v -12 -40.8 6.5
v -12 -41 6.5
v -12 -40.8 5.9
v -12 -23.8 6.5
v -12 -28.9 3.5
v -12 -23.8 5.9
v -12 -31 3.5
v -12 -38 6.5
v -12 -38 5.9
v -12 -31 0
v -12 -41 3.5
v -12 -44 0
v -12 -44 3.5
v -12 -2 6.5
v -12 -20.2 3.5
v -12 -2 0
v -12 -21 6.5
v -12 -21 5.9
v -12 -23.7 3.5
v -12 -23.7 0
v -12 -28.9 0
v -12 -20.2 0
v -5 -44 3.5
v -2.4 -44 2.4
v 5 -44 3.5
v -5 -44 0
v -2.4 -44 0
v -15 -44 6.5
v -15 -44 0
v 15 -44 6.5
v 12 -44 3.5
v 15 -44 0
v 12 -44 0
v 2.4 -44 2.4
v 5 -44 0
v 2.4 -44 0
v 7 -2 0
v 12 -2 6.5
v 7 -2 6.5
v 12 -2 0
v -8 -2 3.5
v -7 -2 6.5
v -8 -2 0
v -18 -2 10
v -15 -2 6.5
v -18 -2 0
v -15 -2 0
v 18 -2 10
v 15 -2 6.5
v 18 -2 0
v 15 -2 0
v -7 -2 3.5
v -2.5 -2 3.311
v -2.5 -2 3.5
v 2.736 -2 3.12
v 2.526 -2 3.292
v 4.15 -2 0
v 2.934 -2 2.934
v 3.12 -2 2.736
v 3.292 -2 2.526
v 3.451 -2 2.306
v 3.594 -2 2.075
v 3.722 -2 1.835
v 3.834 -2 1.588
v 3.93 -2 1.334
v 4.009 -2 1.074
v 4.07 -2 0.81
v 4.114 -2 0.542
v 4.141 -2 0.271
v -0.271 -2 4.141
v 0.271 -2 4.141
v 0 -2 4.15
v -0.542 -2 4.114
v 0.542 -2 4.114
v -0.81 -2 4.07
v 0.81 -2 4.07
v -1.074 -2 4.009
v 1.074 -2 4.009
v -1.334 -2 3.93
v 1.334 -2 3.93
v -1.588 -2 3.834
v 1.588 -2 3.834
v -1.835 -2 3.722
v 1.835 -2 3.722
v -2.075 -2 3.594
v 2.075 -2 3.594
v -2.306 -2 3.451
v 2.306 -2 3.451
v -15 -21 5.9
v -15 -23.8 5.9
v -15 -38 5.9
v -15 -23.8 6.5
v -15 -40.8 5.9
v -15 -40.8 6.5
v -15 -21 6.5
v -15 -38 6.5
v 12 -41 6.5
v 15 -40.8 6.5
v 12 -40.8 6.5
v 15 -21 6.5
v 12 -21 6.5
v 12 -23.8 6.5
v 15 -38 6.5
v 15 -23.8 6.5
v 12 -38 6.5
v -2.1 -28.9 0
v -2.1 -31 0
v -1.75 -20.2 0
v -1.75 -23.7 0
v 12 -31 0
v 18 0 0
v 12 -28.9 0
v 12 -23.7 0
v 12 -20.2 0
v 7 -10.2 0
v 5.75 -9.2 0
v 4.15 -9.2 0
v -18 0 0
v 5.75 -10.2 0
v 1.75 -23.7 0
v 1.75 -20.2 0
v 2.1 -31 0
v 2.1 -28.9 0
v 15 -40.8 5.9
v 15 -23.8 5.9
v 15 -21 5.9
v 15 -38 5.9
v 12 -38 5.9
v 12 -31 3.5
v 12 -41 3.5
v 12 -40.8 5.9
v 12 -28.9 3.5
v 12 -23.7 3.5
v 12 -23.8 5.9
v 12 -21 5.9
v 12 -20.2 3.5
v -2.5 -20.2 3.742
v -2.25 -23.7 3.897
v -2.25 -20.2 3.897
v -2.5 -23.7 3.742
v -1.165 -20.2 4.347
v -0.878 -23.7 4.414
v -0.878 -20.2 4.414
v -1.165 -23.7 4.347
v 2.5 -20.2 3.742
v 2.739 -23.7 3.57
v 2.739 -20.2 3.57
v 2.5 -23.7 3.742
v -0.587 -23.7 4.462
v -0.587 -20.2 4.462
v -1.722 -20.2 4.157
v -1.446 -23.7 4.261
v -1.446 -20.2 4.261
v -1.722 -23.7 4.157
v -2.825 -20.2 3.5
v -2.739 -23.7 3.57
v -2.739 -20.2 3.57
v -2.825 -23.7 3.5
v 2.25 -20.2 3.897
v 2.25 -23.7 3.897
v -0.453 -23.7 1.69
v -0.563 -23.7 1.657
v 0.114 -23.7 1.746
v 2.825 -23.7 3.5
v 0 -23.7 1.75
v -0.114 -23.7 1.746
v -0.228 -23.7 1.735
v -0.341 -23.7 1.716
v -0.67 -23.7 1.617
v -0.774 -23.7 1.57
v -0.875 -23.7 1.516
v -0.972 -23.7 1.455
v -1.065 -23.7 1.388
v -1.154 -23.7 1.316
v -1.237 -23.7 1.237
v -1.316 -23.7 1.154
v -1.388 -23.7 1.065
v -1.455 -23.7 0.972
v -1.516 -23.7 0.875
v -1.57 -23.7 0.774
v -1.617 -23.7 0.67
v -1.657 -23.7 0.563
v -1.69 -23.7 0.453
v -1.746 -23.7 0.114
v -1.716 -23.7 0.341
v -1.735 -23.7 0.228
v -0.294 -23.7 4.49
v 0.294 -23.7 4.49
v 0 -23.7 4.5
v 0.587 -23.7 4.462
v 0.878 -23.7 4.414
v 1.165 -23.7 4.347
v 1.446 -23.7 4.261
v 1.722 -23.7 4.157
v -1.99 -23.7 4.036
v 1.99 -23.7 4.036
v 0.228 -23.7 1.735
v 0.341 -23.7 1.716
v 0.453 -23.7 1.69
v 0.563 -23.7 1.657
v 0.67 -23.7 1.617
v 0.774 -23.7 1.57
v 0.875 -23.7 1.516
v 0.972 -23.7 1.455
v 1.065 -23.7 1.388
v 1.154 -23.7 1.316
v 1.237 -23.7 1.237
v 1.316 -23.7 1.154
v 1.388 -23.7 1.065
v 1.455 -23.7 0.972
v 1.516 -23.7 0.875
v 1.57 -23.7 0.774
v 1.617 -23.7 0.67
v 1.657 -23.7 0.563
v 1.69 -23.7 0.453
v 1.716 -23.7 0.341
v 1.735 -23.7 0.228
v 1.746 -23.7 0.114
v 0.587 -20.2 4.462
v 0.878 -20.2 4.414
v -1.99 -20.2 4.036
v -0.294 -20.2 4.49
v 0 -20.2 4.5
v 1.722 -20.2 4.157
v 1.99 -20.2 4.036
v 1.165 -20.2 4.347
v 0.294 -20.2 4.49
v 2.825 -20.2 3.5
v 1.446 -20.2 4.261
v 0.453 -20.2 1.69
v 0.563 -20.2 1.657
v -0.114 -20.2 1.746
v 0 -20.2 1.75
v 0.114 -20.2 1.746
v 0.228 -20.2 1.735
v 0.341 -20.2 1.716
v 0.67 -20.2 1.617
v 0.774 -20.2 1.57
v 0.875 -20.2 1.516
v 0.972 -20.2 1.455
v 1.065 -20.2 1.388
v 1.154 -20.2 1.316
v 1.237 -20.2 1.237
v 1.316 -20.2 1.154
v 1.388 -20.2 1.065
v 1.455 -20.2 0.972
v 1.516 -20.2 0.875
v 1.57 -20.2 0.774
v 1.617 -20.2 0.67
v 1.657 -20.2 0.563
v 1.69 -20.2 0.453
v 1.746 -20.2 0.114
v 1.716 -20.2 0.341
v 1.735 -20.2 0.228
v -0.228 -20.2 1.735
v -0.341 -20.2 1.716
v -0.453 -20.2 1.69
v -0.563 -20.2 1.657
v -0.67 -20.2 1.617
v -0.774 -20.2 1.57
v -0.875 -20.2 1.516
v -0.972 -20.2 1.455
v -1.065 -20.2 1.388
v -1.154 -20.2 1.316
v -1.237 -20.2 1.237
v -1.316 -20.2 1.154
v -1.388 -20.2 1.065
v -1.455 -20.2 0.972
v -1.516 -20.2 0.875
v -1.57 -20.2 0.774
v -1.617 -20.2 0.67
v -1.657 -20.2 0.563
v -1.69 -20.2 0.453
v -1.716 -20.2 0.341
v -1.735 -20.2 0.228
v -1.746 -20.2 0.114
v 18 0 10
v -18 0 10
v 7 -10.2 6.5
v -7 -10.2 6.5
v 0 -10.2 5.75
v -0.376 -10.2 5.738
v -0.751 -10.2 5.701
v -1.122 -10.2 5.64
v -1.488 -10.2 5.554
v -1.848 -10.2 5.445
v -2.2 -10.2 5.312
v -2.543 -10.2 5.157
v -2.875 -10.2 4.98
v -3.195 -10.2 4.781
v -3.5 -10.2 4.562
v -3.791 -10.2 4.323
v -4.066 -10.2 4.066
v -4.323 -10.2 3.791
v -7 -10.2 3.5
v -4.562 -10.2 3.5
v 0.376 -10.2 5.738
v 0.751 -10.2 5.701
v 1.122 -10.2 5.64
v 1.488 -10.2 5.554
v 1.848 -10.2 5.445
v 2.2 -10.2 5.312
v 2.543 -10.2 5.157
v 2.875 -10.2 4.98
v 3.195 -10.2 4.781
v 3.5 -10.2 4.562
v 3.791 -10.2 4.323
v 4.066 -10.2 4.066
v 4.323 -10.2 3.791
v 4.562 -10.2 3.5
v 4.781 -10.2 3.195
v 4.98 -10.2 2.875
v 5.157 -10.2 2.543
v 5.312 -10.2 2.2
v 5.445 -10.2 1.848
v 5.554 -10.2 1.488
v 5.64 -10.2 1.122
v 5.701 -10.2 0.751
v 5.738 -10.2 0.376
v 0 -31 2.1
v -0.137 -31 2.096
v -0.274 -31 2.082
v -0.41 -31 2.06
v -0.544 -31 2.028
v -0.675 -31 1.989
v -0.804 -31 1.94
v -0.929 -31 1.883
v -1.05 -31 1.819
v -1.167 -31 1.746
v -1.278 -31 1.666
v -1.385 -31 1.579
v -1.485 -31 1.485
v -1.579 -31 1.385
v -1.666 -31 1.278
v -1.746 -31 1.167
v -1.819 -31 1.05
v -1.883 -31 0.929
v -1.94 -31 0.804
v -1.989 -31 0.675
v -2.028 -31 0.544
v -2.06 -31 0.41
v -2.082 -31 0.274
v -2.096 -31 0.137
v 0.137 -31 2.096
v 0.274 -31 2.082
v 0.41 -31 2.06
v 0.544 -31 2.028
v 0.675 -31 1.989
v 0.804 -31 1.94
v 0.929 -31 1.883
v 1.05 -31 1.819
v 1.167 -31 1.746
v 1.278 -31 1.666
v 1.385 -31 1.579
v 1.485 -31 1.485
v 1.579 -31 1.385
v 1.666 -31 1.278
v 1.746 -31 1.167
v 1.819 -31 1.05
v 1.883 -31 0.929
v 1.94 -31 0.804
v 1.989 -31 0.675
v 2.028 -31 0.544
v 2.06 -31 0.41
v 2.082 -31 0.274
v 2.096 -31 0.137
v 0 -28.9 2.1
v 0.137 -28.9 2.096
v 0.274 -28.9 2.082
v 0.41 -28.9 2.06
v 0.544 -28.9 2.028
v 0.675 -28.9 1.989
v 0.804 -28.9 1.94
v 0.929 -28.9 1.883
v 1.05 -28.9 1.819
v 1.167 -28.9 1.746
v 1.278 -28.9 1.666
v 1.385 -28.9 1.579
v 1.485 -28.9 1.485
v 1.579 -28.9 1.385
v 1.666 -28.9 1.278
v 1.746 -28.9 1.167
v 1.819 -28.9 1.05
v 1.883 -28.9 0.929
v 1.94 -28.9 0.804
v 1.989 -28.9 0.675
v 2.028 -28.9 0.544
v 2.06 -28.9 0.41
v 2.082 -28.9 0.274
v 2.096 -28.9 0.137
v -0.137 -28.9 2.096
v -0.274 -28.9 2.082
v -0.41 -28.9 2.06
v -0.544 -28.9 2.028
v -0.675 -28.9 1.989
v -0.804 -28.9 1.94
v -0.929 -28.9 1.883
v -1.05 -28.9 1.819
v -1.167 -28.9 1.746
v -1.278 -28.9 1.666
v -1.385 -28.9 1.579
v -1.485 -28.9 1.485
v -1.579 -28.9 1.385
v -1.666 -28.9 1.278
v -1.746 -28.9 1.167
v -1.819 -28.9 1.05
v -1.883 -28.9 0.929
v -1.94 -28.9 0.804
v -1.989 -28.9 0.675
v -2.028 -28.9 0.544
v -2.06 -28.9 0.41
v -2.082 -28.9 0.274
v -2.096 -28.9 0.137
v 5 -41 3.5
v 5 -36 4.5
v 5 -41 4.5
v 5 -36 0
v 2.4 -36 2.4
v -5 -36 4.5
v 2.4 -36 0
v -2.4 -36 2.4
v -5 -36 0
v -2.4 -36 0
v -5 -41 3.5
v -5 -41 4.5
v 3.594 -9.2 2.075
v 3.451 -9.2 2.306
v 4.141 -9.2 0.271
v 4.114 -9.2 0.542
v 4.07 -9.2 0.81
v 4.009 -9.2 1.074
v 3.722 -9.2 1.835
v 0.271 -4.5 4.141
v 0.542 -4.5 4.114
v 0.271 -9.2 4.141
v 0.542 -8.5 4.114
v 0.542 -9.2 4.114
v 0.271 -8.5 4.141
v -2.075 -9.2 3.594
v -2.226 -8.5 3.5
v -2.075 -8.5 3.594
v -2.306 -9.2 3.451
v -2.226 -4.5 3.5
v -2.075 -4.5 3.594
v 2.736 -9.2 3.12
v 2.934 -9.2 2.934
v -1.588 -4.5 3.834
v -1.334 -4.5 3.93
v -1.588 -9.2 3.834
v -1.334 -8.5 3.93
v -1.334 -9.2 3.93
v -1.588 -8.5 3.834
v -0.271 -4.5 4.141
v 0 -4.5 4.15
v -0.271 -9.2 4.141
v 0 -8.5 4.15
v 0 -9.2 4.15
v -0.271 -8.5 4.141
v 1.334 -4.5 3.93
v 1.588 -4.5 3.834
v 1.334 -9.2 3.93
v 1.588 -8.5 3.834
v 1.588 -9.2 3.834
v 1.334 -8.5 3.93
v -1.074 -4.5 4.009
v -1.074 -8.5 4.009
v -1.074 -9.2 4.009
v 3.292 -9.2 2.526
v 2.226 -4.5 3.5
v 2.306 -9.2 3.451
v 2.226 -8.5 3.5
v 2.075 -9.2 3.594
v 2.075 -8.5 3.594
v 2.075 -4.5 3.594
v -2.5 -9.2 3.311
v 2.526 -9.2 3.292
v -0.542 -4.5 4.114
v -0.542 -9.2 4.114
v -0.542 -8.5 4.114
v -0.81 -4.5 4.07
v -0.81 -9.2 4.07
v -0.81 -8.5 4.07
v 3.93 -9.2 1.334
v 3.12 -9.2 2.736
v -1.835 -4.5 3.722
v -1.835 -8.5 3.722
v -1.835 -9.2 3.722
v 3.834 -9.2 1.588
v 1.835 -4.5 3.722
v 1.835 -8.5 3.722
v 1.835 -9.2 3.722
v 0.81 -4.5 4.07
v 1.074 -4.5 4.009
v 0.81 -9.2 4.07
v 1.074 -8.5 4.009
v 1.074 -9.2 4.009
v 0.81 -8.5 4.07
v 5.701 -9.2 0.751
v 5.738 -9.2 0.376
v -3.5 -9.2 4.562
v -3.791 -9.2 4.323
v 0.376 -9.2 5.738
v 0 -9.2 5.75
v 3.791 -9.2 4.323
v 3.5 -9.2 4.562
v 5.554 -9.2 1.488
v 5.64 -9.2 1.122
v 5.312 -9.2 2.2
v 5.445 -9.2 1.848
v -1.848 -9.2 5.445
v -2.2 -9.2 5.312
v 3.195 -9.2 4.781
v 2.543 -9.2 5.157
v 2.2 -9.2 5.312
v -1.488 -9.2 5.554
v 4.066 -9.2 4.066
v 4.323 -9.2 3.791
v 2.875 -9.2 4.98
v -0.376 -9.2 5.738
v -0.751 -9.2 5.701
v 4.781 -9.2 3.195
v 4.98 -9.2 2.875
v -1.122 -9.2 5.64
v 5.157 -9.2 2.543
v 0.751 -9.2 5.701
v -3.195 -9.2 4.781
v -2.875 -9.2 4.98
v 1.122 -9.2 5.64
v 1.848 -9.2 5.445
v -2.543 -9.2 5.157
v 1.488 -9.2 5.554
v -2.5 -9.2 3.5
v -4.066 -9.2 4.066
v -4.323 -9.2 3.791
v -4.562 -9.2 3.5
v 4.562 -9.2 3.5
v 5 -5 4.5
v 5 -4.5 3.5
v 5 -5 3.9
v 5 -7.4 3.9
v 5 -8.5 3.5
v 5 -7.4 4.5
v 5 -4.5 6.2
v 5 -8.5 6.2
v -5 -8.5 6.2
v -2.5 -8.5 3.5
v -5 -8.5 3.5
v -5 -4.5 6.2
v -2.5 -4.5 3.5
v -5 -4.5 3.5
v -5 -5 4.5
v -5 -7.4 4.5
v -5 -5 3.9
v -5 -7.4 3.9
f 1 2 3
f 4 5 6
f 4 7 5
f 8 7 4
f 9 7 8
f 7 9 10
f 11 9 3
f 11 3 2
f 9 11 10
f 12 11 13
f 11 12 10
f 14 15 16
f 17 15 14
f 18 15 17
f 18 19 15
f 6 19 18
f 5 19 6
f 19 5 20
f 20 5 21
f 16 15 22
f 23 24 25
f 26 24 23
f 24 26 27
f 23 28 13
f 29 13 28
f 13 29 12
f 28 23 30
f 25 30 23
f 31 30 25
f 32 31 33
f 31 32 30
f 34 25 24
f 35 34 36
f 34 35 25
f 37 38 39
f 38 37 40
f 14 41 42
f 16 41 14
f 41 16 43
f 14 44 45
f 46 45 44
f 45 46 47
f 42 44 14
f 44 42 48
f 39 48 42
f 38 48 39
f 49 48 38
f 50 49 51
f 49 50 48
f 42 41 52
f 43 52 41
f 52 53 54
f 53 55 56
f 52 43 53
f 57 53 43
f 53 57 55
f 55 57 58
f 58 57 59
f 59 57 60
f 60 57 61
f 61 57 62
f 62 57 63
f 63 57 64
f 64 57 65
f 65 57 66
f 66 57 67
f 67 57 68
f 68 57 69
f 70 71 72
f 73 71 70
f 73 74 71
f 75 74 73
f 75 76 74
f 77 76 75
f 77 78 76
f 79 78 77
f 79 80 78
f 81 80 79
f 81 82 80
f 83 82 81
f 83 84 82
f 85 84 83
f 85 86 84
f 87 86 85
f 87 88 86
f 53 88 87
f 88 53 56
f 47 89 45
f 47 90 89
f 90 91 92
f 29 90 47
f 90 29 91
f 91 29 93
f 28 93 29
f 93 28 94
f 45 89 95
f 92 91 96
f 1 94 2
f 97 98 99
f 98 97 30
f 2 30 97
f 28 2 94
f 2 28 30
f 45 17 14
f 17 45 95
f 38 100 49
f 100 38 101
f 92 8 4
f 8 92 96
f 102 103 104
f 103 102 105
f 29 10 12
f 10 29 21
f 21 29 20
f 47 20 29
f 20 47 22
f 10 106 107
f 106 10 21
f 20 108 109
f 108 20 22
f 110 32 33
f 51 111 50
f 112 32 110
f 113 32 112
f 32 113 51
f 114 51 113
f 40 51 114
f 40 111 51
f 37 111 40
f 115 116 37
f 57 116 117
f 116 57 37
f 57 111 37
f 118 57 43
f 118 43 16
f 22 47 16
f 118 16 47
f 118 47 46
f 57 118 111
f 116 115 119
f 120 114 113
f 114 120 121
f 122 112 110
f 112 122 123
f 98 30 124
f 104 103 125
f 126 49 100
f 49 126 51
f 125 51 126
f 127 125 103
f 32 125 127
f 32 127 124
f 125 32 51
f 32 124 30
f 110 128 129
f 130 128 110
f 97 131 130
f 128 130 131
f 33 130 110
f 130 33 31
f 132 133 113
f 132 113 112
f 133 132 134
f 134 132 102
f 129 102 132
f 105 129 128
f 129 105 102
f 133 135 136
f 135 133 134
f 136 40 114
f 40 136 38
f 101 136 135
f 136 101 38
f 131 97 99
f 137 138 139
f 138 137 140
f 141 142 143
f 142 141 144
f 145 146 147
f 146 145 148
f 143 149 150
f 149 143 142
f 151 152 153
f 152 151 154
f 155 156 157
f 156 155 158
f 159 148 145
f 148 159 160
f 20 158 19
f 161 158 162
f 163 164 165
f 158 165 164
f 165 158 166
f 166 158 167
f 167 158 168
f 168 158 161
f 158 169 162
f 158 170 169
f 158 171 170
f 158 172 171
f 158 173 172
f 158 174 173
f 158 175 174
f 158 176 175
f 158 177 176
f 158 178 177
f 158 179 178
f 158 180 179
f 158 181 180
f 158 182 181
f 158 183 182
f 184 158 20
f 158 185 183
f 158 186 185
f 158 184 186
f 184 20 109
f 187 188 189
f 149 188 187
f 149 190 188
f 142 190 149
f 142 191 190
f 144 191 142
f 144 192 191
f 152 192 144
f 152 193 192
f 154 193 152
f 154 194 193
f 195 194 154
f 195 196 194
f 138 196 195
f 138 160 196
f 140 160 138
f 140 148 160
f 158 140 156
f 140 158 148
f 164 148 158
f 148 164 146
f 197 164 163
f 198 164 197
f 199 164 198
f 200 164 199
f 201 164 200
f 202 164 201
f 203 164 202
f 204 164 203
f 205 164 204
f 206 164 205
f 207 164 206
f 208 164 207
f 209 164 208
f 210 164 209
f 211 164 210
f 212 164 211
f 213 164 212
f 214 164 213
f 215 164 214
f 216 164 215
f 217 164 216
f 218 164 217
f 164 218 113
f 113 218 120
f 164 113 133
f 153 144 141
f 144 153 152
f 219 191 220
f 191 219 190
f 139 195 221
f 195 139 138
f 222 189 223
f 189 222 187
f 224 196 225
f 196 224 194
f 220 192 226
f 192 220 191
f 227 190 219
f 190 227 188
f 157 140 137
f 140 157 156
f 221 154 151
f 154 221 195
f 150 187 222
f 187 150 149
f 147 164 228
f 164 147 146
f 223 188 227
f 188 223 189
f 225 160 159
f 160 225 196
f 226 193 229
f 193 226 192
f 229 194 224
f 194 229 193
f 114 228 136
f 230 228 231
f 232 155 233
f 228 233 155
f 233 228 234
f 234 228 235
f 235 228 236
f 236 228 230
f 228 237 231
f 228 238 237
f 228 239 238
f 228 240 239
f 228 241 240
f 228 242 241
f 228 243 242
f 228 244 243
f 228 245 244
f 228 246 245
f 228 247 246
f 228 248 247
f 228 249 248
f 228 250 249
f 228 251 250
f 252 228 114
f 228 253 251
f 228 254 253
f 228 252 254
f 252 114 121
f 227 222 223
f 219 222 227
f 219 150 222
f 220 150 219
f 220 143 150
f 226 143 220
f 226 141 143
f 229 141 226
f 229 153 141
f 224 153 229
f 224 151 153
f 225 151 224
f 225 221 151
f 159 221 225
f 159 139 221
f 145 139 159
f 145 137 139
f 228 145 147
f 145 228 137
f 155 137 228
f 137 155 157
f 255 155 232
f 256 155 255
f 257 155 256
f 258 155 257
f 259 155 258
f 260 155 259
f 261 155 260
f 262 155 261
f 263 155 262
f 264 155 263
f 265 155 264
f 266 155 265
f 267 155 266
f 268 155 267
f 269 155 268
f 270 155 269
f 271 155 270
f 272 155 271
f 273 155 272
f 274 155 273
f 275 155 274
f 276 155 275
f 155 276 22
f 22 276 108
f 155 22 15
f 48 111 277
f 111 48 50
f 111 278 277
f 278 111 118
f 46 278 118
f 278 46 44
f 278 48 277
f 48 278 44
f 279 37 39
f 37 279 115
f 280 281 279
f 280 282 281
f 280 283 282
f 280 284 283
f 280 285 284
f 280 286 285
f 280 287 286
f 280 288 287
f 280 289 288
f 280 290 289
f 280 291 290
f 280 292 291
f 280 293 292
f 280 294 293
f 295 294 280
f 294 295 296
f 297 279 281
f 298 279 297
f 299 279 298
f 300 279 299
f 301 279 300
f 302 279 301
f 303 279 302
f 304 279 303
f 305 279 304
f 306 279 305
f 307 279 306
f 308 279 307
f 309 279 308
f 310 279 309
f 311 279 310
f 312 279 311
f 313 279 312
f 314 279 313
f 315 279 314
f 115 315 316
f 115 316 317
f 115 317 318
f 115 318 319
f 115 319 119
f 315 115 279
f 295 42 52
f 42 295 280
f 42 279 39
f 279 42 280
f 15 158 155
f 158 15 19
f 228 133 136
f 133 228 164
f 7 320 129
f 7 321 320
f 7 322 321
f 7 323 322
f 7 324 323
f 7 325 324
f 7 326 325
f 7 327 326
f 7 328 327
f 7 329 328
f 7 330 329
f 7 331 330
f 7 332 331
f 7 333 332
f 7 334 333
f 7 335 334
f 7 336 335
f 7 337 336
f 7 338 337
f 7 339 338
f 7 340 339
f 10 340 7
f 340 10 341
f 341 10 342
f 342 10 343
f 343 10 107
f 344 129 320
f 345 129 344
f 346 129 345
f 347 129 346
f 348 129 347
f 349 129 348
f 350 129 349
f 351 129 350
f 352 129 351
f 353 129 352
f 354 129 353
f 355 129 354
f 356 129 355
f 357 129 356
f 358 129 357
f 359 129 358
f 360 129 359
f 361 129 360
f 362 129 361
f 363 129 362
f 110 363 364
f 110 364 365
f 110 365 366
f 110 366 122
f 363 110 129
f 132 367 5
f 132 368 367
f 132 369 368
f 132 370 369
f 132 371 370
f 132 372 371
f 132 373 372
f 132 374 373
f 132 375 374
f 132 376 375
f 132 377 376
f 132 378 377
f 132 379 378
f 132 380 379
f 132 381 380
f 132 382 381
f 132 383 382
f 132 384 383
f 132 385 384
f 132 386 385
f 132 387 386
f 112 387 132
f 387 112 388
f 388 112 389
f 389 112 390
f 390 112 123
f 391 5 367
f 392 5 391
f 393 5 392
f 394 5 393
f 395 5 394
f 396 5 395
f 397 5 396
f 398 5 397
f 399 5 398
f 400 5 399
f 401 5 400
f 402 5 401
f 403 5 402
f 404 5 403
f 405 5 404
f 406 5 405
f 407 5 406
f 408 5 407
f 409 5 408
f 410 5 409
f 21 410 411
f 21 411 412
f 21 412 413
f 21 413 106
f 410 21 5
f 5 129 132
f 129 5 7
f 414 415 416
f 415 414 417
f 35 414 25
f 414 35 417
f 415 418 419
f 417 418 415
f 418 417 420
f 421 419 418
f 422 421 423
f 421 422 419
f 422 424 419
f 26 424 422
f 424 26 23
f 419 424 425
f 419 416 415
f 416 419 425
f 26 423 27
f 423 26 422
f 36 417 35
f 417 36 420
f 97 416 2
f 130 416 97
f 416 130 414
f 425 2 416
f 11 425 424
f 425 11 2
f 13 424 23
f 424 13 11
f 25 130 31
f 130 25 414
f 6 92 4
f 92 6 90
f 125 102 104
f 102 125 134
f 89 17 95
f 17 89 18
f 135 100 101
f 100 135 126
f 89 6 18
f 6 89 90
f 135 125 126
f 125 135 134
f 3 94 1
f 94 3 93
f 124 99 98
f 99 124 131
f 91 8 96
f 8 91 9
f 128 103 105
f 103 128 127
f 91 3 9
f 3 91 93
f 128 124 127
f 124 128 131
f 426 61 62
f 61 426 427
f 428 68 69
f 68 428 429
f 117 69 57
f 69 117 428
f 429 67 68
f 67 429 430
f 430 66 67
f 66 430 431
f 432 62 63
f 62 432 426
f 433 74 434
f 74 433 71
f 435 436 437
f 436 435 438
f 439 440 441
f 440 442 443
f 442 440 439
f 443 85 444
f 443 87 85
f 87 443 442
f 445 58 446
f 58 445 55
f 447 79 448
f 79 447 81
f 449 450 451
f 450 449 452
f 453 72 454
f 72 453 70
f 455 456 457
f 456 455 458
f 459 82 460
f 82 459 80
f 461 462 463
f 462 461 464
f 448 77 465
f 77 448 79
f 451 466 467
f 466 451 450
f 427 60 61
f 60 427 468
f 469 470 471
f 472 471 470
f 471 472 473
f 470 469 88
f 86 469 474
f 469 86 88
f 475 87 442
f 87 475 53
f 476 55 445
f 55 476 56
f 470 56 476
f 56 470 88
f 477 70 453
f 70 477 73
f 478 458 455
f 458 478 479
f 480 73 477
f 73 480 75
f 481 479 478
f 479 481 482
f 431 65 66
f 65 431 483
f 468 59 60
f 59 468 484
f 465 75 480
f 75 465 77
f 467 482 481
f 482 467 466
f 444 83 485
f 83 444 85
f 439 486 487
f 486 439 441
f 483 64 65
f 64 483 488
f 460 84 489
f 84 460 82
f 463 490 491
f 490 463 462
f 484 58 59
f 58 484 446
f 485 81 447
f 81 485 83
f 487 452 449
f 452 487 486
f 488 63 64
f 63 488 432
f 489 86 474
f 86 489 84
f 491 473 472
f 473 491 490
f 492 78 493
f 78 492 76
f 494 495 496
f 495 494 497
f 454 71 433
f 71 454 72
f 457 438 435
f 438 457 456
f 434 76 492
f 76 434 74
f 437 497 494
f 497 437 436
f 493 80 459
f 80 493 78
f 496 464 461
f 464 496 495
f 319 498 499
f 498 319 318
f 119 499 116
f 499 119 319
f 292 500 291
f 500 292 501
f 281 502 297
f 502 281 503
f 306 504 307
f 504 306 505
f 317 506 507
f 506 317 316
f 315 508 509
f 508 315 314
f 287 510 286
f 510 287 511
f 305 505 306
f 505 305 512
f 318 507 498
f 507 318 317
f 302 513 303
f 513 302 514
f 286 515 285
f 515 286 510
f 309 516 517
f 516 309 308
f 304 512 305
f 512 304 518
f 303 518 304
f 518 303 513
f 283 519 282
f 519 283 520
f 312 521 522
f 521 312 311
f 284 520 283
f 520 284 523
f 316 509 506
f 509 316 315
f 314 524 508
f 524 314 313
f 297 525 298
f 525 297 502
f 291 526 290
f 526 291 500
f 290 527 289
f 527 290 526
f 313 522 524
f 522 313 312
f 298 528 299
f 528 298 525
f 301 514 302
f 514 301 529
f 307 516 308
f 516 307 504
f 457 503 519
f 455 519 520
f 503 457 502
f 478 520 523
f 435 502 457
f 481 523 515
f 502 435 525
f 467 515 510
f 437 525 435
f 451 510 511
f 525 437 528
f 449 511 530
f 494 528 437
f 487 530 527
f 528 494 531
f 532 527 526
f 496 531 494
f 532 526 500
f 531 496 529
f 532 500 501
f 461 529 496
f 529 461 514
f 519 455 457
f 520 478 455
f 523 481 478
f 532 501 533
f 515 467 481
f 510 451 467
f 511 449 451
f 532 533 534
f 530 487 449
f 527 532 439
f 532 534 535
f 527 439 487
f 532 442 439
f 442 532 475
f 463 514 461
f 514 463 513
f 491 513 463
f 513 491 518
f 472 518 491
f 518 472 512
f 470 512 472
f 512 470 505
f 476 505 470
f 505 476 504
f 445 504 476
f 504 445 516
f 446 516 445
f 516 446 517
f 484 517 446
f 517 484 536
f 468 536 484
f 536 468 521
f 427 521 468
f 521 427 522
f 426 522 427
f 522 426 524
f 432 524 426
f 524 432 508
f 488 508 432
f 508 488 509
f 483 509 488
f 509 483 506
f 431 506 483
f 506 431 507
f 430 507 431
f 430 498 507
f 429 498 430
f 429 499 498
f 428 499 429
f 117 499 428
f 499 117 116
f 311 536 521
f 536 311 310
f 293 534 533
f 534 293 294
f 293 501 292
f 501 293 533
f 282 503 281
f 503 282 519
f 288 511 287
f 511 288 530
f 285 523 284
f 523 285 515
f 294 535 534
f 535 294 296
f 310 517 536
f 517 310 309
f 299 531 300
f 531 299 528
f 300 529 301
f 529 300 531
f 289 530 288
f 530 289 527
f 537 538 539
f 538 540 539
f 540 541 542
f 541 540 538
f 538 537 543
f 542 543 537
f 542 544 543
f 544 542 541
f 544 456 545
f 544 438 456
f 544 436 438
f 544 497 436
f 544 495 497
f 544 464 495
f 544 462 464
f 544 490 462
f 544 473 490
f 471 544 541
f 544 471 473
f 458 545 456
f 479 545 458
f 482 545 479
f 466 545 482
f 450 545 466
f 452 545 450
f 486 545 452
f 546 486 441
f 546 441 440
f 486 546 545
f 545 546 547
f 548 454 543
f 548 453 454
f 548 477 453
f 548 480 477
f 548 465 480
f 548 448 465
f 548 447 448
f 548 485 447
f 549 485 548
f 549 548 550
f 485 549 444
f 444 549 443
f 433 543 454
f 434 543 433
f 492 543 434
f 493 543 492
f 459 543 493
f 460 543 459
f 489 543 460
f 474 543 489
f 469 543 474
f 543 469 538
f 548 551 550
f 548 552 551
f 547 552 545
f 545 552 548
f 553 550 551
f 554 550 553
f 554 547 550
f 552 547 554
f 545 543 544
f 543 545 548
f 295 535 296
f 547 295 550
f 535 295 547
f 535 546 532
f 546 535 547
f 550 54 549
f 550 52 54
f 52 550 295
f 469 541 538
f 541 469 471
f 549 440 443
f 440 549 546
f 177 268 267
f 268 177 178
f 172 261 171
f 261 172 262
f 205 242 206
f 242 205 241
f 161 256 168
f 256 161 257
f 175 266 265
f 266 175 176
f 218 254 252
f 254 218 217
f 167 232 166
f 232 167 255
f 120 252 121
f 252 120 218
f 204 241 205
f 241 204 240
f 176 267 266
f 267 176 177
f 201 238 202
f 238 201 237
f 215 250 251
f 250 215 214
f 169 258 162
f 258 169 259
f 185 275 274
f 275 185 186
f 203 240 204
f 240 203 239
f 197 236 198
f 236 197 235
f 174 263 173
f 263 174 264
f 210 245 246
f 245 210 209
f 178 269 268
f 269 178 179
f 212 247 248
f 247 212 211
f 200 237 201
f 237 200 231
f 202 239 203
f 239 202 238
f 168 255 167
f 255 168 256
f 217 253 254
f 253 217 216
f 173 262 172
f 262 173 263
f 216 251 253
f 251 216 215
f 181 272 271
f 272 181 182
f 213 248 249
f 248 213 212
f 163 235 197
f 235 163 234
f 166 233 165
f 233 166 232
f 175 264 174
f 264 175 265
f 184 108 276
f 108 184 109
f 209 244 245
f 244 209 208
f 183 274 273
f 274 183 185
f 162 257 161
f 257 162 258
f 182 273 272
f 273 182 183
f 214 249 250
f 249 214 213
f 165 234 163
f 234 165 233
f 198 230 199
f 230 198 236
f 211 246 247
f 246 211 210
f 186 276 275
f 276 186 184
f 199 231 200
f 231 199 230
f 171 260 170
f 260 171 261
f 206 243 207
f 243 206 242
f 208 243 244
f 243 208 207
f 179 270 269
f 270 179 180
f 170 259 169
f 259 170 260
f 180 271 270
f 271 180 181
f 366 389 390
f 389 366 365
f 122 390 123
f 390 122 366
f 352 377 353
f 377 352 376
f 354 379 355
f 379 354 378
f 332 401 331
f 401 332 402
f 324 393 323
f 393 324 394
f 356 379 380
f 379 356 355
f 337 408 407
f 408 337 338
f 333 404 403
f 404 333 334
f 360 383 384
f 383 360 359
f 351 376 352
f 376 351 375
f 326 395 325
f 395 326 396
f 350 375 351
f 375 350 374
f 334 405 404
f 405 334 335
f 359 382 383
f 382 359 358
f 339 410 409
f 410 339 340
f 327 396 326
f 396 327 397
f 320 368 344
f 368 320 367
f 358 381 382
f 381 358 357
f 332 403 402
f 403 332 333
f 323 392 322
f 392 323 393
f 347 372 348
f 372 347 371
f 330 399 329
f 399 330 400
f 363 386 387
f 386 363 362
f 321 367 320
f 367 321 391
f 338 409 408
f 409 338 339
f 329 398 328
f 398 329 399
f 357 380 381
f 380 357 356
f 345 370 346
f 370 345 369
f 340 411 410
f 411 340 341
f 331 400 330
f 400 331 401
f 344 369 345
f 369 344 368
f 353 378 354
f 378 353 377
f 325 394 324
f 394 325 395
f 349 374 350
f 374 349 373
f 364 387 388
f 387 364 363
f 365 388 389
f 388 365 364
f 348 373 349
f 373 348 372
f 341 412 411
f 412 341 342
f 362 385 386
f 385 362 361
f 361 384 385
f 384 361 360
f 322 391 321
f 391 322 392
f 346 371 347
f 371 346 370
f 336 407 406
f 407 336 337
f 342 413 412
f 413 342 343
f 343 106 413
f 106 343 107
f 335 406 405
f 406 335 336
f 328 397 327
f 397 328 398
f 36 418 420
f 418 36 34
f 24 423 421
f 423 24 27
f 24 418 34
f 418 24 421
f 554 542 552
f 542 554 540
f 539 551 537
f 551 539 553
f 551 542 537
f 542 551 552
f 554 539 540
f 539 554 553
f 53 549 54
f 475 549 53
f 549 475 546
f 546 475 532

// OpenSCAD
// E-302 revision 4, mm. E-301 functional thread and foot retained.
// Source photo dimensions are NOT physical measurements of owner motors.
part="half-front";
pin_height=50;
tip_r=1.05; // Owner selected C (three identification notches), 2026-10-19.
$fn=96;
body_d=8.30;
pcb_half_width=3.5; // open side envelope, unmeasured PCB: check before closing
socket_bottom=13.2; // Remove 2 mm at motor end; bearing/drive seat stay fixed.
socket_top=19.5;
module cradle_half(){
 difference(){
  union(){
   translate([-18,0,0])cube([36,10,2]);
   for(x=[-15,12])translate([x,0,2])cube([3,6.5,42]);
   translate([-7,0,2])cube([14,6.5,8.2]);
   translate([-15,0,20.2])cube([30,3.5,3.5]);
   intersection(){translate([0,0,20.2])cylinder(d=9,h=3.5);translate([-5,0,20])cube([10,5,4]);}
   translate([-15,0,28.9])cube([30,3.5,2.1]);
   translate([-5,0,36])cube([10,4.5,8]);
   translate([-15,3.5,41])cube([30,3,3]);
  }
  translate([0,0,2])cylinder(d=body_d,h=10);
  translate([0,0,9.2])cylinder(d=11.5,h=1.1);
  // Clearance behind transverse flexure; rigid cradle stops frame closure.
  translate([-5,3.5,4.5])cube([10,2.7,4]);
  translate([0,0,19.9])cylinder(d=3.5,h=4.1);
  translate([0,0,28.8])cylinder(d=4.2,h=2.4);
  translate([-2.4,-2.4,35.9])cube([4.8,4.8,8.3]);
  // Keep elastic away from the motor spring and open PCB windows.
  for(z=[21,38])translate([-16,5.9,z])cube([32,2,2.8]);
 }
 // Transverse two-ended flexure: 10 mm bridge, .6 thick, 2.4 axial width.
 // Flat first bridging layer has anchors at both ends; nominal preload .10.
 translate([-5.2,3.9,5])cube([10.4,.6,2.4]);
}
// Cut AFTER adding spring: no spring or wall may cross the PCB envelope.
module frame_half(){
 difference(){
  cradle_half();
  translate([-8,-.01,2])cube([5.5,pcb_half_width+.01,8.5]);
 }
}
module bore_profile(){
 difference(){
  circle(d=2.5);
  // Rounded wall-integrated lobes, not a miniature involute gear.
  for(a=[0,120,240])rotate(a)translate([tip_r+.5,0])circle(r=.5);
 }
}
module cup(){
 difference(){
  union(){
   translate([-6.5,-6.5,24.2])cube([13,13,4.6]);
   translate([0,0,19.7])cylinder(d=3,h=4.51);
   translate([0,0,socket_bottom])cylinder(d=5,h=19.71-socket_bottom);
  }
  translate([-5.2,-5.2,26.2])cube([10.4,10.4,3]);
  translate([0,0,socket_bottom-.01])linear_extrude(socket_top-socket_bottom+.01)bore_profile();
  // Lead-in removes the first .5 mm of full-depth engagement.
  translate([0,0,socket_bottom-.01])cylinder(d1=2.9,d2=1.9,h=.51);
  // 1/2/3 external notches identify A/N/C, away from bearing and square socket.
  for(i=[0:(tip_r<.98?0:tip_r>1.02?2:1)])
   translate([-3+i*3,6.1,27])cube([1,1,2]);
 }
}
if(part=="half-front")rotate([90,0,0])frame_half();
if(part=="half-back")rotate([90,0,0])mirror([1,0,0])frame_half();
if(part=="cup")translate([0,0,28.8])rotate([180,0,0])cup();
if(part=="assembly") {frame_half();mirror([0,1,0])frame_half();cup();}

// Exact supplied E-301 meshes are retained as functional source geometry.
if(part=="screw")import("../2026-10-17-microstepper-screw-pin/screw.stl");
if(part=="pin-18")import("../2026-10-17-microstepper-screw-pin/pin.stl");
if(part=="pin-50")union(){
 import("../2026-10-17-microstepper-screw-pin/pin.stl");
 // Overlap only the straight upper tube; threaded bottom and print foot unchanged.
 translate([0,0,17.9])difference(){
  translate([-2.2,-2.2,0])cube([4.4,4.4,pin_height-17.9]);
  translate([-1.76,-1.76,-.01])cube([3.52,3.52,pin_height-17.8]);
 }
}
